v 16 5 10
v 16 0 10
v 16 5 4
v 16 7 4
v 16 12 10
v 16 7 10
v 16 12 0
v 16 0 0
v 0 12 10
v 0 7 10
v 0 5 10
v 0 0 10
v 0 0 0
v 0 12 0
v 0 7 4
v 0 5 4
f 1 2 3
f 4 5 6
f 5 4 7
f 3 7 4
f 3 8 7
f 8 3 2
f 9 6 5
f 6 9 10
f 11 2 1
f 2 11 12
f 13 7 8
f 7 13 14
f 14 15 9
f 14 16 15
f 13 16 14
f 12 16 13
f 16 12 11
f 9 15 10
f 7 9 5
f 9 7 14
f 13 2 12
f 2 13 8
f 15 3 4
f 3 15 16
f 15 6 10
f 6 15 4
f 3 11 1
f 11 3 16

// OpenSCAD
$fn = 32;

// ----------------------------------------------------------------------
// Micro clip: slotted block, 5-20 mm class
// ----------------------------------------------------------------------

// --- parameters (mm) ---
block_l = 16;             // block length, X
block_w = 12;             // block width, Y
block_h = 10;             // block height, Z
slot_w = 2;               // slot width
slot_d = 6;               // slot depth from the top
fit_tol = 0.05;           // tolerance for press fits, mm
free_tol = 0.2;           // tolerance for clearance fits, mm

difference() {
  cube([block_l, block_w, block_h]);
  translate([-1, block_w / 2 - slot_w / 2, block_h - slot_d])
    cube([block_l + 2, slot_w, slot_d + 1]);
}
